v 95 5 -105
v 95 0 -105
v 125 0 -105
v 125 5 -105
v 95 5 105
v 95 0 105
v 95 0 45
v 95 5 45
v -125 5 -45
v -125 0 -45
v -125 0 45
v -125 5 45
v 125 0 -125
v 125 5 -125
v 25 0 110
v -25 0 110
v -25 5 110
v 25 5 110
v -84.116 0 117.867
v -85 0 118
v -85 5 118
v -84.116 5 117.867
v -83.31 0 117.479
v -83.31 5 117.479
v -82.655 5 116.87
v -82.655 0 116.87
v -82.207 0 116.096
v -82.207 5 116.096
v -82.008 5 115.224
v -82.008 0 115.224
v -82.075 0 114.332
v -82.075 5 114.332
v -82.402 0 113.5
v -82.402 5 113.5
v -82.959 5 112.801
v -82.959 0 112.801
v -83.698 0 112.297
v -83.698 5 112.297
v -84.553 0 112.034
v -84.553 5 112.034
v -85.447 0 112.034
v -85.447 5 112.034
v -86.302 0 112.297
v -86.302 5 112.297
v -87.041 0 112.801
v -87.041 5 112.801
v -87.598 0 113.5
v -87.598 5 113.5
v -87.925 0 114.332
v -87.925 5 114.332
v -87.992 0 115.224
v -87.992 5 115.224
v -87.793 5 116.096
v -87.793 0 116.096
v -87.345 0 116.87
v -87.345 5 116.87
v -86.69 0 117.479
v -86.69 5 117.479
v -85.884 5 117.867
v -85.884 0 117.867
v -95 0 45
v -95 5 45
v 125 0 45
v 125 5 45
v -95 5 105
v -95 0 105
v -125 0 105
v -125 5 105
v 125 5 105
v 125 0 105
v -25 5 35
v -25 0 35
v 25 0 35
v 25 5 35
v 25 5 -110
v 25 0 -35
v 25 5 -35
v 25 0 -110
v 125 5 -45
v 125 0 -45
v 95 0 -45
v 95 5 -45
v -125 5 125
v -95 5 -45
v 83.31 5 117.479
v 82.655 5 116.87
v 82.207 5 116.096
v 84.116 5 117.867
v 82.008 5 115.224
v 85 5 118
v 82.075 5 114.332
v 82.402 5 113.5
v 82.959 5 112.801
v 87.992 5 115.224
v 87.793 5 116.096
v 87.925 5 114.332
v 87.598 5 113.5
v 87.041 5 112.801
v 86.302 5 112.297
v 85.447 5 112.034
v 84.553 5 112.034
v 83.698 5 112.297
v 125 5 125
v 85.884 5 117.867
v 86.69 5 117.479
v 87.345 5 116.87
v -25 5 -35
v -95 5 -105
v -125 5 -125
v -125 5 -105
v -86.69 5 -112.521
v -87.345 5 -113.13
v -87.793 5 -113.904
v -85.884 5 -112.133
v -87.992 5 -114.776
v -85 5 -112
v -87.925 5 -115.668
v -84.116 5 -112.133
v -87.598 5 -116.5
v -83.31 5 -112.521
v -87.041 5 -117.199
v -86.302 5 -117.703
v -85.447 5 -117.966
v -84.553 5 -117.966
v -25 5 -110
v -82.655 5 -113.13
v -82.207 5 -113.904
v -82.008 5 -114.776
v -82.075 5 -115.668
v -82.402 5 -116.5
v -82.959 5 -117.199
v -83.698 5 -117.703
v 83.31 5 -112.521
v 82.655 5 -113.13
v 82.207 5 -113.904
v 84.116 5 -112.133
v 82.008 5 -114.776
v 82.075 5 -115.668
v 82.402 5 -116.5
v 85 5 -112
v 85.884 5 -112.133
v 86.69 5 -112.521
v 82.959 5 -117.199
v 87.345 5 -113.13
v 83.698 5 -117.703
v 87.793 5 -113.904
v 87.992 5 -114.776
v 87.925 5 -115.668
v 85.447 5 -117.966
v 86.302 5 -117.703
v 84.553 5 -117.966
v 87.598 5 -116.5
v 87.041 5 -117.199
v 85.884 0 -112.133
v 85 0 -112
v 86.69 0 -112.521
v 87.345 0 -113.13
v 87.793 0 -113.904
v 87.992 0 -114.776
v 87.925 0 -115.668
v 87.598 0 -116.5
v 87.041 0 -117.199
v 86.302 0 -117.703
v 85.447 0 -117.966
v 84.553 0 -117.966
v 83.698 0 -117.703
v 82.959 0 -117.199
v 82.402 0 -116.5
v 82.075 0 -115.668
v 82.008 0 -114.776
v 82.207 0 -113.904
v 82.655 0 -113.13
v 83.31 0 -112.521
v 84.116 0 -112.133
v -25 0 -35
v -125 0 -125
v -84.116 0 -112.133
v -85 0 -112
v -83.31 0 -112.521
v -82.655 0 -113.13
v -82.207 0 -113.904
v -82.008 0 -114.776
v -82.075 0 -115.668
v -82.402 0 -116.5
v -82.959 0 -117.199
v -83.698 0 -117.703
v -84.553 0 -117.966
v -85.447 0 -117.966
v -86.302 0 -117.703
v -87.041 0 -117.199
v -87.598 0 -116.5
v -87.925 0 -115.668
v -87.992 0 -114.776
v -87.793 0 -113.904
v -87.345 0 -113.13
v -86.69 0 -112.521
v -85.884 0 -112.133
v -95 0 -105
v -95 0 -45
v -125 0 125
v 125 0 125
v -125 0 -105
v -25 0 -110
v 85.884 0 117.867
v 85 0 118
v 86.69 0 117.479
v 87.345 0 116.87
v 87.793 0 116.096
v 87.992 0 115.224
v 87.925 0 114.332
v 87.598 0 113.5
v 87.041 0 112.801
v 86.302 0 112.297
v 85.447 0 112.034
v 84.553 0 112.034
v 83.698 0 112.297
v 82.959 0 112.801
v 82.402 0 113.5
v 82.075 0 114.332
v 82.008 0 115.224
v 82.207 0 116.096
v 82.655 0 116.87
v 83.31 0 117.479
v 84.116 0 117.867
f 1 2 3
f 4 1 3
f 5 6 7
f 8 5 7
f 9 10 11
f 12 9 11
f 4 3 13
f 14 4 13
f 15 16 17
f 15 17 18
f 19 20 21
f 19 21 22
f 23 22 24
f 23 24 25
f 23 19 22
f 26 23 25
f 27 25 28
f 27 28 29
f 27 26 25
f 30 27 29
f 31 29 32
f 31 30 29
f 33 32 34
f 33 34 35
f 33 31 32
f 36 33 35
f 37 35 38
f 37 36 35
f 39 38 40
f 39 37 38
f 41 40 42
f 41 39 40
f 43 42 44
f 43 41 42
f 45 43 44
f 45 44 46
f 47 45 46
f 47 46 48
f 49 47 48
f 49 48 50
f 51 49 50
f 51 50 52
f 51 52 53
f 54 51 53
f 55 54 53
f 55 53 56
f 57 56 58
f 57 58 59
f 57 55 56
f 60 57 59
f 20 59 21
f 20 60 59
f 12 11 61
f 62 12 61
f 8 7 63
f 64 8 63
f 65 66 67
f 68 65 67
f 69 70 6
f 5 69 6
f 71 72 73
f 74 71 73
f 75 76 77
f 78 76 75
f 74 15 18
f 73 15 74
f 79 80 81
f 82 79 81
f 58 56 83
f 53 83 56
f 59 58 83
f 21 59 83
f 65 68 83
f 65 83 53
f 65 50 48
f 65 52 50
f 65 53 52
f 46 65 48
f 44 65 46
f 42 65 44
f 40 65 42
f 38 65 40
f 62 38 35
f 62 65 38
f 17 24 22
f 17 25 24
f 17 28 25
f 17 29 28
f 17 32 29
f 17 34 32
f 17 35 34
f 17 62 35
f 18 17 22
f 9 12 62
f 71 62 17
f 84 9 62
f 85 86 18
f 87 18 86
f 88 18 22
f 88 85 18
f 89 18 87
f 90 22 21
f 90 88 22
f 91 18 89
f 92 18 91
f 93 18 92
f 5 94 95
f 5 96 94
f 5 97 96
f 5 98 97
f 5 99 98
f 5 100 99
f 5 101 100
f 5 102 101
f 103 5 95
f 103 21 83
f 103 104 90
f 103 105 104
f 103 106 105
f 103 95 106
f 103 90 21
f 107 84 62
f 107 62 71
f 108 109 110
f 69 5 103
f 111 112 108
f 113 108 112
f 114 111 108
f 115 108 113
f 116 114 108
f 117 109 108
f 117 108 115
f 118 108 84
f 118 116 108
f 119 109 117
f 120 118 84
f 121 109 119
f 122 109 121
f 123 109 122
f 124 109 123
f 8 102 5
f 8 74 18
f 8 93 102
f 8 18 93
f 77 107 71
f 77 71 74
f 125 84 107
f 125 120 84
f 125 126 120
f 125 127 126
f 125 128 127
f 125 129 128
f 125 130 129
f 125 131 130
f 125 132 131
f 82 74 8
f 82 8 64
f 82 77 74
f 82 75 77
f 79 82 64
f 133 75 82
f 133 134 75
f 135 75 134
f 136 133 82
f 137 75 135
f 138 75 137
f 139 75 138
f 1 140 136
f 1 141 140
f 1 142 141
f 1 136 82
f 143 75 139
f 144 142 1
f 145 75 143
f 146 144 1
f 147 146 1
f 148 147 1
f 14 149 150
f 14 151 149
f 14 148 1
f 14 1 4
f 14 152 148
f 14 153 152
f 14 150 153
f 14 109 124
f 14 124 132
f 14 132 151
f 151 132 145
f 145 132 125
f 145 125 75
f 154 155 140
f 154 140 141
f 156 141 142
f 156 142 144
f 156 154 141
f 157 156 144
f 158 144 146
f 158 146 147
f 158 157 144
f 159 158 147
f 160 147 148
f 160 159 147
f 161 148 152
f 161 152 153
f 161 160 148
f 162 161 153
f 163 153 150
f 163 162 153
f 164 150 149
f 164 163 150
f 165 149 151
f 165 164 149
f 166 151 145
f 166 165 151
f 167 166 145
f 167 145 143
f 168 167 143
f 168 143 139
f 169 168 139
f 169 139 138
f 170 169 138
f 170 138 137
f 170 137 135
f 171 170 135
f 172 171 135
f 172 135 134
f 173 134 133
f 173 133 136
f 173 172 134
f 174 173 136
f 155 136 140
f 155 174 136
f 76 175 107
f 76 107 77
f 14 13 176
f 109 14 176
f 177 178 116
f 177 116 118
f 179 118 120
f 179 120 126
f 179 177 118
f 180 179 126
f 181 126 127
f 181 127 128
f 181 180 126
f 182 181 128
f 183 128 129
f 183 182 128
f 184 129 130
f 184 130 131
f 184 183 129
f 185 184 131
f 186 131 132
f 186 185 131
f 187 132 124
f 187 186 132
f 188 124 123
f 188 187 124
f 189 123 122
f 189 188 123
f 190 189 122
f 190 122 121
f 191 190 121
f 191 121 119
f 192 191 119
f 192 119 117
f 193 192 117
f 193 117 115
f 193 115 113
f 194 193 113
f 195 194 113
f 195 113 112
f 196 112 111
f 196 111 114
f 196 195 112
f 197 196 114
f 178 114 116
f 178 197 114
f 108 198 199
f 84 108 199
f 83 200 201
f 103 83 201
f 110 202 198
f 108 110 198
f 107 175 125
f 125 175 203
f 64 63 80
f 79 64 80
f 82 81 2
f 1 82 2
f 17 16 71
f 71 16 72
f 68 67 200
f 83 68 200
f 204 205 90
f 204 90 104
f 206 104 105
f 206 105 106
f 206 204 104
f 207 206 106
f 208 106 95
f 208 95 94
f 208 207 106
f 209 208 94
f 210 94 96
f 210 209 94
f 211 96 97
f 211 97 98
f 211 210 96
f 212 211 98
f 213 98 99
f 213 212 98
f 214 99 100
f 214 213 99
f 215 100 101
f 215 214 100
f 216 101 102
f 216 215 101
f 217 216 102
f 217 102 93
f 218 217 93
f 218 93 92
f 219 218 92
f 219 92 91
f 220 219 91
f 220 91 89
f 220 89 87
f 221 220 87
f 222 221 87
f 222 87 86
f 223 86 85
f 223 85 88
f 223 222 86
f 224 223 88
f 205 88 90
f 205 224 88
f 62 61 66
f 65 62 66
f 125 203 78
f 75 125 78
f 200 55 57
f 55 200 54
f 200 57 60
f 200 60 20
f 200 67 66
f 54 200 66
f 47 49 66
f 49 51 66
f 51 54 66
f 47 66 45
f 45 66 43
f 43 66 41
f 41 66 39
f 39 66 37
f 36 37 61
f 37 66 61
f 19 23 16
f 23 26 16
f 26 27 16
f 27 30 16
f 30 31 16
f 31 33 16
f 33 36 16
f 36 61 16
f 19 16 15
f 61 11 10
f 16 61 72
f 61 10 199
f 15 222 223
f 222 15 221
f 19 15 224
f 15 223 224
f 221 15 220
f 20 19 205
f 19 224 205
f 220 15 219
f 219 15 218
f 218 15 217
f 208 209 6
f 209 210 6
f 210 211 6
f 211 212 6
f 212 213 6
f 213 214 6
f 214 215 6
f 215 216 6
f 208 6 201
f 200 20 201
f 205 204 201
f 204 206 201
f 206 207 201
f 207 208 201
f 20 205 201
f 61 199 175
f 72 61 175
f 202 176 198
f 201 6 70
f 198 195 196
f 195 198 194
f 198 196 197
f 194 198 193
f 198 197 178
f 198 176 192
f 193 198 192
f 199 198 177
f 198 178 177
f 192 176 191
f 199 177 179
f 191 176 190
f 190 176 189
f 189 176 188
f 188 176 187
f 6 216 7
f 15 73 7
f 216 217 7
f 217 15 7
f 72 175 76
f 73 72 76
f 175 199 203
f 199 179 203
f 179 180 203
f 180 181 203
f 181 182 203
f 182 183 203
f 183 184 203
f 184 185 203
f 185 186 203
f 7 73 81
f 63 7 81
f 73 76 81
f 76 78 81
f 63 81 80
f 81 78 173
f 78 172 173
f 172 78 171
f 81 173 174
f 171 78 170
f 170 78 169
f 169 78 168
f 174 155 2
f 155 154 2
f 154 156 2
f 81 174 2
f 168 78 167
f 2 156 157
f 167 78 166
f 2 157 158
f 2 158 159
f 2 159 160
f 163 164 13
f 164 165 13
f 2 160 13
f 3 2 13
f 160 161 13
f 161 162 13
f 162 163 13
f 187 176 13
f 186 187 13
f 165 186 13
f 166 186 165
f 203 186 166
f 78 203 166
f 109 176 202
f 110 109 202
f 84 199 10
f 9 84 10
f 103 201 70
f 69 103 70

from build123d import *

# Parameters (mm, degrees)
SKETCH2_W           = 50
SKETCH2_H           = 75
SKETCH2_R           = 3
BOSS_EXTRUDE1_DEPTH = 5


with BuildPart() as part:
    # Sketch2 → Boss-Extrude1 (new body)
    with BuildSketch(Plane(origin=(0, 0, 0), x_dir=(1, 0, 0), z_dir=(0, 1, 0))):
        Polygon((-125, 125), (-125, 105), (-95, 105), (-95, 45), (-125, 45), (-125, -45), (-95, -45), (-95, -105), (-125, -105), (-125, -125), (125, -125), (125, -105), (95, -105), (95, -45), (125, -45), (125, 45), (95, 45), (95, 105), (125, 105), (125, 125), align=None)
        with Locations((0, -72.5)):
            Rectangle(SKETCH2_W, SKETCH2_H, mode=Mode.SUBTRACT)
        with Locations((0, 72.5)):
            Rectangle(SKETCH2_W, SKETCH2_H, mode=Mode.SUBTRACT)
        with Locations(Location((-85, 115, 0), (0, 0, 270))):
            Circle(SKETCH2_R, mode=Mode.SUBTRACT)
        with Locations(Location((-85, -115, 0), (0, 0, 270))):
            Circle(SKETCH2_R, mode=Mode.SUBTRACT)
        with Locations(Location((85, 115, 0), (0, 0, 270))):
            Circle(SKETCH2_R, mode=Mode.SUBTRACT)
        with Locations(Location((85, -115, 0), (0, 0, 270))):
            Circle(SKETCH2_R, mode=Mode.SUBTRACT)
    extrude(amount=BOSS_EXTRUDE1_DEPTH)


solid = part.part
